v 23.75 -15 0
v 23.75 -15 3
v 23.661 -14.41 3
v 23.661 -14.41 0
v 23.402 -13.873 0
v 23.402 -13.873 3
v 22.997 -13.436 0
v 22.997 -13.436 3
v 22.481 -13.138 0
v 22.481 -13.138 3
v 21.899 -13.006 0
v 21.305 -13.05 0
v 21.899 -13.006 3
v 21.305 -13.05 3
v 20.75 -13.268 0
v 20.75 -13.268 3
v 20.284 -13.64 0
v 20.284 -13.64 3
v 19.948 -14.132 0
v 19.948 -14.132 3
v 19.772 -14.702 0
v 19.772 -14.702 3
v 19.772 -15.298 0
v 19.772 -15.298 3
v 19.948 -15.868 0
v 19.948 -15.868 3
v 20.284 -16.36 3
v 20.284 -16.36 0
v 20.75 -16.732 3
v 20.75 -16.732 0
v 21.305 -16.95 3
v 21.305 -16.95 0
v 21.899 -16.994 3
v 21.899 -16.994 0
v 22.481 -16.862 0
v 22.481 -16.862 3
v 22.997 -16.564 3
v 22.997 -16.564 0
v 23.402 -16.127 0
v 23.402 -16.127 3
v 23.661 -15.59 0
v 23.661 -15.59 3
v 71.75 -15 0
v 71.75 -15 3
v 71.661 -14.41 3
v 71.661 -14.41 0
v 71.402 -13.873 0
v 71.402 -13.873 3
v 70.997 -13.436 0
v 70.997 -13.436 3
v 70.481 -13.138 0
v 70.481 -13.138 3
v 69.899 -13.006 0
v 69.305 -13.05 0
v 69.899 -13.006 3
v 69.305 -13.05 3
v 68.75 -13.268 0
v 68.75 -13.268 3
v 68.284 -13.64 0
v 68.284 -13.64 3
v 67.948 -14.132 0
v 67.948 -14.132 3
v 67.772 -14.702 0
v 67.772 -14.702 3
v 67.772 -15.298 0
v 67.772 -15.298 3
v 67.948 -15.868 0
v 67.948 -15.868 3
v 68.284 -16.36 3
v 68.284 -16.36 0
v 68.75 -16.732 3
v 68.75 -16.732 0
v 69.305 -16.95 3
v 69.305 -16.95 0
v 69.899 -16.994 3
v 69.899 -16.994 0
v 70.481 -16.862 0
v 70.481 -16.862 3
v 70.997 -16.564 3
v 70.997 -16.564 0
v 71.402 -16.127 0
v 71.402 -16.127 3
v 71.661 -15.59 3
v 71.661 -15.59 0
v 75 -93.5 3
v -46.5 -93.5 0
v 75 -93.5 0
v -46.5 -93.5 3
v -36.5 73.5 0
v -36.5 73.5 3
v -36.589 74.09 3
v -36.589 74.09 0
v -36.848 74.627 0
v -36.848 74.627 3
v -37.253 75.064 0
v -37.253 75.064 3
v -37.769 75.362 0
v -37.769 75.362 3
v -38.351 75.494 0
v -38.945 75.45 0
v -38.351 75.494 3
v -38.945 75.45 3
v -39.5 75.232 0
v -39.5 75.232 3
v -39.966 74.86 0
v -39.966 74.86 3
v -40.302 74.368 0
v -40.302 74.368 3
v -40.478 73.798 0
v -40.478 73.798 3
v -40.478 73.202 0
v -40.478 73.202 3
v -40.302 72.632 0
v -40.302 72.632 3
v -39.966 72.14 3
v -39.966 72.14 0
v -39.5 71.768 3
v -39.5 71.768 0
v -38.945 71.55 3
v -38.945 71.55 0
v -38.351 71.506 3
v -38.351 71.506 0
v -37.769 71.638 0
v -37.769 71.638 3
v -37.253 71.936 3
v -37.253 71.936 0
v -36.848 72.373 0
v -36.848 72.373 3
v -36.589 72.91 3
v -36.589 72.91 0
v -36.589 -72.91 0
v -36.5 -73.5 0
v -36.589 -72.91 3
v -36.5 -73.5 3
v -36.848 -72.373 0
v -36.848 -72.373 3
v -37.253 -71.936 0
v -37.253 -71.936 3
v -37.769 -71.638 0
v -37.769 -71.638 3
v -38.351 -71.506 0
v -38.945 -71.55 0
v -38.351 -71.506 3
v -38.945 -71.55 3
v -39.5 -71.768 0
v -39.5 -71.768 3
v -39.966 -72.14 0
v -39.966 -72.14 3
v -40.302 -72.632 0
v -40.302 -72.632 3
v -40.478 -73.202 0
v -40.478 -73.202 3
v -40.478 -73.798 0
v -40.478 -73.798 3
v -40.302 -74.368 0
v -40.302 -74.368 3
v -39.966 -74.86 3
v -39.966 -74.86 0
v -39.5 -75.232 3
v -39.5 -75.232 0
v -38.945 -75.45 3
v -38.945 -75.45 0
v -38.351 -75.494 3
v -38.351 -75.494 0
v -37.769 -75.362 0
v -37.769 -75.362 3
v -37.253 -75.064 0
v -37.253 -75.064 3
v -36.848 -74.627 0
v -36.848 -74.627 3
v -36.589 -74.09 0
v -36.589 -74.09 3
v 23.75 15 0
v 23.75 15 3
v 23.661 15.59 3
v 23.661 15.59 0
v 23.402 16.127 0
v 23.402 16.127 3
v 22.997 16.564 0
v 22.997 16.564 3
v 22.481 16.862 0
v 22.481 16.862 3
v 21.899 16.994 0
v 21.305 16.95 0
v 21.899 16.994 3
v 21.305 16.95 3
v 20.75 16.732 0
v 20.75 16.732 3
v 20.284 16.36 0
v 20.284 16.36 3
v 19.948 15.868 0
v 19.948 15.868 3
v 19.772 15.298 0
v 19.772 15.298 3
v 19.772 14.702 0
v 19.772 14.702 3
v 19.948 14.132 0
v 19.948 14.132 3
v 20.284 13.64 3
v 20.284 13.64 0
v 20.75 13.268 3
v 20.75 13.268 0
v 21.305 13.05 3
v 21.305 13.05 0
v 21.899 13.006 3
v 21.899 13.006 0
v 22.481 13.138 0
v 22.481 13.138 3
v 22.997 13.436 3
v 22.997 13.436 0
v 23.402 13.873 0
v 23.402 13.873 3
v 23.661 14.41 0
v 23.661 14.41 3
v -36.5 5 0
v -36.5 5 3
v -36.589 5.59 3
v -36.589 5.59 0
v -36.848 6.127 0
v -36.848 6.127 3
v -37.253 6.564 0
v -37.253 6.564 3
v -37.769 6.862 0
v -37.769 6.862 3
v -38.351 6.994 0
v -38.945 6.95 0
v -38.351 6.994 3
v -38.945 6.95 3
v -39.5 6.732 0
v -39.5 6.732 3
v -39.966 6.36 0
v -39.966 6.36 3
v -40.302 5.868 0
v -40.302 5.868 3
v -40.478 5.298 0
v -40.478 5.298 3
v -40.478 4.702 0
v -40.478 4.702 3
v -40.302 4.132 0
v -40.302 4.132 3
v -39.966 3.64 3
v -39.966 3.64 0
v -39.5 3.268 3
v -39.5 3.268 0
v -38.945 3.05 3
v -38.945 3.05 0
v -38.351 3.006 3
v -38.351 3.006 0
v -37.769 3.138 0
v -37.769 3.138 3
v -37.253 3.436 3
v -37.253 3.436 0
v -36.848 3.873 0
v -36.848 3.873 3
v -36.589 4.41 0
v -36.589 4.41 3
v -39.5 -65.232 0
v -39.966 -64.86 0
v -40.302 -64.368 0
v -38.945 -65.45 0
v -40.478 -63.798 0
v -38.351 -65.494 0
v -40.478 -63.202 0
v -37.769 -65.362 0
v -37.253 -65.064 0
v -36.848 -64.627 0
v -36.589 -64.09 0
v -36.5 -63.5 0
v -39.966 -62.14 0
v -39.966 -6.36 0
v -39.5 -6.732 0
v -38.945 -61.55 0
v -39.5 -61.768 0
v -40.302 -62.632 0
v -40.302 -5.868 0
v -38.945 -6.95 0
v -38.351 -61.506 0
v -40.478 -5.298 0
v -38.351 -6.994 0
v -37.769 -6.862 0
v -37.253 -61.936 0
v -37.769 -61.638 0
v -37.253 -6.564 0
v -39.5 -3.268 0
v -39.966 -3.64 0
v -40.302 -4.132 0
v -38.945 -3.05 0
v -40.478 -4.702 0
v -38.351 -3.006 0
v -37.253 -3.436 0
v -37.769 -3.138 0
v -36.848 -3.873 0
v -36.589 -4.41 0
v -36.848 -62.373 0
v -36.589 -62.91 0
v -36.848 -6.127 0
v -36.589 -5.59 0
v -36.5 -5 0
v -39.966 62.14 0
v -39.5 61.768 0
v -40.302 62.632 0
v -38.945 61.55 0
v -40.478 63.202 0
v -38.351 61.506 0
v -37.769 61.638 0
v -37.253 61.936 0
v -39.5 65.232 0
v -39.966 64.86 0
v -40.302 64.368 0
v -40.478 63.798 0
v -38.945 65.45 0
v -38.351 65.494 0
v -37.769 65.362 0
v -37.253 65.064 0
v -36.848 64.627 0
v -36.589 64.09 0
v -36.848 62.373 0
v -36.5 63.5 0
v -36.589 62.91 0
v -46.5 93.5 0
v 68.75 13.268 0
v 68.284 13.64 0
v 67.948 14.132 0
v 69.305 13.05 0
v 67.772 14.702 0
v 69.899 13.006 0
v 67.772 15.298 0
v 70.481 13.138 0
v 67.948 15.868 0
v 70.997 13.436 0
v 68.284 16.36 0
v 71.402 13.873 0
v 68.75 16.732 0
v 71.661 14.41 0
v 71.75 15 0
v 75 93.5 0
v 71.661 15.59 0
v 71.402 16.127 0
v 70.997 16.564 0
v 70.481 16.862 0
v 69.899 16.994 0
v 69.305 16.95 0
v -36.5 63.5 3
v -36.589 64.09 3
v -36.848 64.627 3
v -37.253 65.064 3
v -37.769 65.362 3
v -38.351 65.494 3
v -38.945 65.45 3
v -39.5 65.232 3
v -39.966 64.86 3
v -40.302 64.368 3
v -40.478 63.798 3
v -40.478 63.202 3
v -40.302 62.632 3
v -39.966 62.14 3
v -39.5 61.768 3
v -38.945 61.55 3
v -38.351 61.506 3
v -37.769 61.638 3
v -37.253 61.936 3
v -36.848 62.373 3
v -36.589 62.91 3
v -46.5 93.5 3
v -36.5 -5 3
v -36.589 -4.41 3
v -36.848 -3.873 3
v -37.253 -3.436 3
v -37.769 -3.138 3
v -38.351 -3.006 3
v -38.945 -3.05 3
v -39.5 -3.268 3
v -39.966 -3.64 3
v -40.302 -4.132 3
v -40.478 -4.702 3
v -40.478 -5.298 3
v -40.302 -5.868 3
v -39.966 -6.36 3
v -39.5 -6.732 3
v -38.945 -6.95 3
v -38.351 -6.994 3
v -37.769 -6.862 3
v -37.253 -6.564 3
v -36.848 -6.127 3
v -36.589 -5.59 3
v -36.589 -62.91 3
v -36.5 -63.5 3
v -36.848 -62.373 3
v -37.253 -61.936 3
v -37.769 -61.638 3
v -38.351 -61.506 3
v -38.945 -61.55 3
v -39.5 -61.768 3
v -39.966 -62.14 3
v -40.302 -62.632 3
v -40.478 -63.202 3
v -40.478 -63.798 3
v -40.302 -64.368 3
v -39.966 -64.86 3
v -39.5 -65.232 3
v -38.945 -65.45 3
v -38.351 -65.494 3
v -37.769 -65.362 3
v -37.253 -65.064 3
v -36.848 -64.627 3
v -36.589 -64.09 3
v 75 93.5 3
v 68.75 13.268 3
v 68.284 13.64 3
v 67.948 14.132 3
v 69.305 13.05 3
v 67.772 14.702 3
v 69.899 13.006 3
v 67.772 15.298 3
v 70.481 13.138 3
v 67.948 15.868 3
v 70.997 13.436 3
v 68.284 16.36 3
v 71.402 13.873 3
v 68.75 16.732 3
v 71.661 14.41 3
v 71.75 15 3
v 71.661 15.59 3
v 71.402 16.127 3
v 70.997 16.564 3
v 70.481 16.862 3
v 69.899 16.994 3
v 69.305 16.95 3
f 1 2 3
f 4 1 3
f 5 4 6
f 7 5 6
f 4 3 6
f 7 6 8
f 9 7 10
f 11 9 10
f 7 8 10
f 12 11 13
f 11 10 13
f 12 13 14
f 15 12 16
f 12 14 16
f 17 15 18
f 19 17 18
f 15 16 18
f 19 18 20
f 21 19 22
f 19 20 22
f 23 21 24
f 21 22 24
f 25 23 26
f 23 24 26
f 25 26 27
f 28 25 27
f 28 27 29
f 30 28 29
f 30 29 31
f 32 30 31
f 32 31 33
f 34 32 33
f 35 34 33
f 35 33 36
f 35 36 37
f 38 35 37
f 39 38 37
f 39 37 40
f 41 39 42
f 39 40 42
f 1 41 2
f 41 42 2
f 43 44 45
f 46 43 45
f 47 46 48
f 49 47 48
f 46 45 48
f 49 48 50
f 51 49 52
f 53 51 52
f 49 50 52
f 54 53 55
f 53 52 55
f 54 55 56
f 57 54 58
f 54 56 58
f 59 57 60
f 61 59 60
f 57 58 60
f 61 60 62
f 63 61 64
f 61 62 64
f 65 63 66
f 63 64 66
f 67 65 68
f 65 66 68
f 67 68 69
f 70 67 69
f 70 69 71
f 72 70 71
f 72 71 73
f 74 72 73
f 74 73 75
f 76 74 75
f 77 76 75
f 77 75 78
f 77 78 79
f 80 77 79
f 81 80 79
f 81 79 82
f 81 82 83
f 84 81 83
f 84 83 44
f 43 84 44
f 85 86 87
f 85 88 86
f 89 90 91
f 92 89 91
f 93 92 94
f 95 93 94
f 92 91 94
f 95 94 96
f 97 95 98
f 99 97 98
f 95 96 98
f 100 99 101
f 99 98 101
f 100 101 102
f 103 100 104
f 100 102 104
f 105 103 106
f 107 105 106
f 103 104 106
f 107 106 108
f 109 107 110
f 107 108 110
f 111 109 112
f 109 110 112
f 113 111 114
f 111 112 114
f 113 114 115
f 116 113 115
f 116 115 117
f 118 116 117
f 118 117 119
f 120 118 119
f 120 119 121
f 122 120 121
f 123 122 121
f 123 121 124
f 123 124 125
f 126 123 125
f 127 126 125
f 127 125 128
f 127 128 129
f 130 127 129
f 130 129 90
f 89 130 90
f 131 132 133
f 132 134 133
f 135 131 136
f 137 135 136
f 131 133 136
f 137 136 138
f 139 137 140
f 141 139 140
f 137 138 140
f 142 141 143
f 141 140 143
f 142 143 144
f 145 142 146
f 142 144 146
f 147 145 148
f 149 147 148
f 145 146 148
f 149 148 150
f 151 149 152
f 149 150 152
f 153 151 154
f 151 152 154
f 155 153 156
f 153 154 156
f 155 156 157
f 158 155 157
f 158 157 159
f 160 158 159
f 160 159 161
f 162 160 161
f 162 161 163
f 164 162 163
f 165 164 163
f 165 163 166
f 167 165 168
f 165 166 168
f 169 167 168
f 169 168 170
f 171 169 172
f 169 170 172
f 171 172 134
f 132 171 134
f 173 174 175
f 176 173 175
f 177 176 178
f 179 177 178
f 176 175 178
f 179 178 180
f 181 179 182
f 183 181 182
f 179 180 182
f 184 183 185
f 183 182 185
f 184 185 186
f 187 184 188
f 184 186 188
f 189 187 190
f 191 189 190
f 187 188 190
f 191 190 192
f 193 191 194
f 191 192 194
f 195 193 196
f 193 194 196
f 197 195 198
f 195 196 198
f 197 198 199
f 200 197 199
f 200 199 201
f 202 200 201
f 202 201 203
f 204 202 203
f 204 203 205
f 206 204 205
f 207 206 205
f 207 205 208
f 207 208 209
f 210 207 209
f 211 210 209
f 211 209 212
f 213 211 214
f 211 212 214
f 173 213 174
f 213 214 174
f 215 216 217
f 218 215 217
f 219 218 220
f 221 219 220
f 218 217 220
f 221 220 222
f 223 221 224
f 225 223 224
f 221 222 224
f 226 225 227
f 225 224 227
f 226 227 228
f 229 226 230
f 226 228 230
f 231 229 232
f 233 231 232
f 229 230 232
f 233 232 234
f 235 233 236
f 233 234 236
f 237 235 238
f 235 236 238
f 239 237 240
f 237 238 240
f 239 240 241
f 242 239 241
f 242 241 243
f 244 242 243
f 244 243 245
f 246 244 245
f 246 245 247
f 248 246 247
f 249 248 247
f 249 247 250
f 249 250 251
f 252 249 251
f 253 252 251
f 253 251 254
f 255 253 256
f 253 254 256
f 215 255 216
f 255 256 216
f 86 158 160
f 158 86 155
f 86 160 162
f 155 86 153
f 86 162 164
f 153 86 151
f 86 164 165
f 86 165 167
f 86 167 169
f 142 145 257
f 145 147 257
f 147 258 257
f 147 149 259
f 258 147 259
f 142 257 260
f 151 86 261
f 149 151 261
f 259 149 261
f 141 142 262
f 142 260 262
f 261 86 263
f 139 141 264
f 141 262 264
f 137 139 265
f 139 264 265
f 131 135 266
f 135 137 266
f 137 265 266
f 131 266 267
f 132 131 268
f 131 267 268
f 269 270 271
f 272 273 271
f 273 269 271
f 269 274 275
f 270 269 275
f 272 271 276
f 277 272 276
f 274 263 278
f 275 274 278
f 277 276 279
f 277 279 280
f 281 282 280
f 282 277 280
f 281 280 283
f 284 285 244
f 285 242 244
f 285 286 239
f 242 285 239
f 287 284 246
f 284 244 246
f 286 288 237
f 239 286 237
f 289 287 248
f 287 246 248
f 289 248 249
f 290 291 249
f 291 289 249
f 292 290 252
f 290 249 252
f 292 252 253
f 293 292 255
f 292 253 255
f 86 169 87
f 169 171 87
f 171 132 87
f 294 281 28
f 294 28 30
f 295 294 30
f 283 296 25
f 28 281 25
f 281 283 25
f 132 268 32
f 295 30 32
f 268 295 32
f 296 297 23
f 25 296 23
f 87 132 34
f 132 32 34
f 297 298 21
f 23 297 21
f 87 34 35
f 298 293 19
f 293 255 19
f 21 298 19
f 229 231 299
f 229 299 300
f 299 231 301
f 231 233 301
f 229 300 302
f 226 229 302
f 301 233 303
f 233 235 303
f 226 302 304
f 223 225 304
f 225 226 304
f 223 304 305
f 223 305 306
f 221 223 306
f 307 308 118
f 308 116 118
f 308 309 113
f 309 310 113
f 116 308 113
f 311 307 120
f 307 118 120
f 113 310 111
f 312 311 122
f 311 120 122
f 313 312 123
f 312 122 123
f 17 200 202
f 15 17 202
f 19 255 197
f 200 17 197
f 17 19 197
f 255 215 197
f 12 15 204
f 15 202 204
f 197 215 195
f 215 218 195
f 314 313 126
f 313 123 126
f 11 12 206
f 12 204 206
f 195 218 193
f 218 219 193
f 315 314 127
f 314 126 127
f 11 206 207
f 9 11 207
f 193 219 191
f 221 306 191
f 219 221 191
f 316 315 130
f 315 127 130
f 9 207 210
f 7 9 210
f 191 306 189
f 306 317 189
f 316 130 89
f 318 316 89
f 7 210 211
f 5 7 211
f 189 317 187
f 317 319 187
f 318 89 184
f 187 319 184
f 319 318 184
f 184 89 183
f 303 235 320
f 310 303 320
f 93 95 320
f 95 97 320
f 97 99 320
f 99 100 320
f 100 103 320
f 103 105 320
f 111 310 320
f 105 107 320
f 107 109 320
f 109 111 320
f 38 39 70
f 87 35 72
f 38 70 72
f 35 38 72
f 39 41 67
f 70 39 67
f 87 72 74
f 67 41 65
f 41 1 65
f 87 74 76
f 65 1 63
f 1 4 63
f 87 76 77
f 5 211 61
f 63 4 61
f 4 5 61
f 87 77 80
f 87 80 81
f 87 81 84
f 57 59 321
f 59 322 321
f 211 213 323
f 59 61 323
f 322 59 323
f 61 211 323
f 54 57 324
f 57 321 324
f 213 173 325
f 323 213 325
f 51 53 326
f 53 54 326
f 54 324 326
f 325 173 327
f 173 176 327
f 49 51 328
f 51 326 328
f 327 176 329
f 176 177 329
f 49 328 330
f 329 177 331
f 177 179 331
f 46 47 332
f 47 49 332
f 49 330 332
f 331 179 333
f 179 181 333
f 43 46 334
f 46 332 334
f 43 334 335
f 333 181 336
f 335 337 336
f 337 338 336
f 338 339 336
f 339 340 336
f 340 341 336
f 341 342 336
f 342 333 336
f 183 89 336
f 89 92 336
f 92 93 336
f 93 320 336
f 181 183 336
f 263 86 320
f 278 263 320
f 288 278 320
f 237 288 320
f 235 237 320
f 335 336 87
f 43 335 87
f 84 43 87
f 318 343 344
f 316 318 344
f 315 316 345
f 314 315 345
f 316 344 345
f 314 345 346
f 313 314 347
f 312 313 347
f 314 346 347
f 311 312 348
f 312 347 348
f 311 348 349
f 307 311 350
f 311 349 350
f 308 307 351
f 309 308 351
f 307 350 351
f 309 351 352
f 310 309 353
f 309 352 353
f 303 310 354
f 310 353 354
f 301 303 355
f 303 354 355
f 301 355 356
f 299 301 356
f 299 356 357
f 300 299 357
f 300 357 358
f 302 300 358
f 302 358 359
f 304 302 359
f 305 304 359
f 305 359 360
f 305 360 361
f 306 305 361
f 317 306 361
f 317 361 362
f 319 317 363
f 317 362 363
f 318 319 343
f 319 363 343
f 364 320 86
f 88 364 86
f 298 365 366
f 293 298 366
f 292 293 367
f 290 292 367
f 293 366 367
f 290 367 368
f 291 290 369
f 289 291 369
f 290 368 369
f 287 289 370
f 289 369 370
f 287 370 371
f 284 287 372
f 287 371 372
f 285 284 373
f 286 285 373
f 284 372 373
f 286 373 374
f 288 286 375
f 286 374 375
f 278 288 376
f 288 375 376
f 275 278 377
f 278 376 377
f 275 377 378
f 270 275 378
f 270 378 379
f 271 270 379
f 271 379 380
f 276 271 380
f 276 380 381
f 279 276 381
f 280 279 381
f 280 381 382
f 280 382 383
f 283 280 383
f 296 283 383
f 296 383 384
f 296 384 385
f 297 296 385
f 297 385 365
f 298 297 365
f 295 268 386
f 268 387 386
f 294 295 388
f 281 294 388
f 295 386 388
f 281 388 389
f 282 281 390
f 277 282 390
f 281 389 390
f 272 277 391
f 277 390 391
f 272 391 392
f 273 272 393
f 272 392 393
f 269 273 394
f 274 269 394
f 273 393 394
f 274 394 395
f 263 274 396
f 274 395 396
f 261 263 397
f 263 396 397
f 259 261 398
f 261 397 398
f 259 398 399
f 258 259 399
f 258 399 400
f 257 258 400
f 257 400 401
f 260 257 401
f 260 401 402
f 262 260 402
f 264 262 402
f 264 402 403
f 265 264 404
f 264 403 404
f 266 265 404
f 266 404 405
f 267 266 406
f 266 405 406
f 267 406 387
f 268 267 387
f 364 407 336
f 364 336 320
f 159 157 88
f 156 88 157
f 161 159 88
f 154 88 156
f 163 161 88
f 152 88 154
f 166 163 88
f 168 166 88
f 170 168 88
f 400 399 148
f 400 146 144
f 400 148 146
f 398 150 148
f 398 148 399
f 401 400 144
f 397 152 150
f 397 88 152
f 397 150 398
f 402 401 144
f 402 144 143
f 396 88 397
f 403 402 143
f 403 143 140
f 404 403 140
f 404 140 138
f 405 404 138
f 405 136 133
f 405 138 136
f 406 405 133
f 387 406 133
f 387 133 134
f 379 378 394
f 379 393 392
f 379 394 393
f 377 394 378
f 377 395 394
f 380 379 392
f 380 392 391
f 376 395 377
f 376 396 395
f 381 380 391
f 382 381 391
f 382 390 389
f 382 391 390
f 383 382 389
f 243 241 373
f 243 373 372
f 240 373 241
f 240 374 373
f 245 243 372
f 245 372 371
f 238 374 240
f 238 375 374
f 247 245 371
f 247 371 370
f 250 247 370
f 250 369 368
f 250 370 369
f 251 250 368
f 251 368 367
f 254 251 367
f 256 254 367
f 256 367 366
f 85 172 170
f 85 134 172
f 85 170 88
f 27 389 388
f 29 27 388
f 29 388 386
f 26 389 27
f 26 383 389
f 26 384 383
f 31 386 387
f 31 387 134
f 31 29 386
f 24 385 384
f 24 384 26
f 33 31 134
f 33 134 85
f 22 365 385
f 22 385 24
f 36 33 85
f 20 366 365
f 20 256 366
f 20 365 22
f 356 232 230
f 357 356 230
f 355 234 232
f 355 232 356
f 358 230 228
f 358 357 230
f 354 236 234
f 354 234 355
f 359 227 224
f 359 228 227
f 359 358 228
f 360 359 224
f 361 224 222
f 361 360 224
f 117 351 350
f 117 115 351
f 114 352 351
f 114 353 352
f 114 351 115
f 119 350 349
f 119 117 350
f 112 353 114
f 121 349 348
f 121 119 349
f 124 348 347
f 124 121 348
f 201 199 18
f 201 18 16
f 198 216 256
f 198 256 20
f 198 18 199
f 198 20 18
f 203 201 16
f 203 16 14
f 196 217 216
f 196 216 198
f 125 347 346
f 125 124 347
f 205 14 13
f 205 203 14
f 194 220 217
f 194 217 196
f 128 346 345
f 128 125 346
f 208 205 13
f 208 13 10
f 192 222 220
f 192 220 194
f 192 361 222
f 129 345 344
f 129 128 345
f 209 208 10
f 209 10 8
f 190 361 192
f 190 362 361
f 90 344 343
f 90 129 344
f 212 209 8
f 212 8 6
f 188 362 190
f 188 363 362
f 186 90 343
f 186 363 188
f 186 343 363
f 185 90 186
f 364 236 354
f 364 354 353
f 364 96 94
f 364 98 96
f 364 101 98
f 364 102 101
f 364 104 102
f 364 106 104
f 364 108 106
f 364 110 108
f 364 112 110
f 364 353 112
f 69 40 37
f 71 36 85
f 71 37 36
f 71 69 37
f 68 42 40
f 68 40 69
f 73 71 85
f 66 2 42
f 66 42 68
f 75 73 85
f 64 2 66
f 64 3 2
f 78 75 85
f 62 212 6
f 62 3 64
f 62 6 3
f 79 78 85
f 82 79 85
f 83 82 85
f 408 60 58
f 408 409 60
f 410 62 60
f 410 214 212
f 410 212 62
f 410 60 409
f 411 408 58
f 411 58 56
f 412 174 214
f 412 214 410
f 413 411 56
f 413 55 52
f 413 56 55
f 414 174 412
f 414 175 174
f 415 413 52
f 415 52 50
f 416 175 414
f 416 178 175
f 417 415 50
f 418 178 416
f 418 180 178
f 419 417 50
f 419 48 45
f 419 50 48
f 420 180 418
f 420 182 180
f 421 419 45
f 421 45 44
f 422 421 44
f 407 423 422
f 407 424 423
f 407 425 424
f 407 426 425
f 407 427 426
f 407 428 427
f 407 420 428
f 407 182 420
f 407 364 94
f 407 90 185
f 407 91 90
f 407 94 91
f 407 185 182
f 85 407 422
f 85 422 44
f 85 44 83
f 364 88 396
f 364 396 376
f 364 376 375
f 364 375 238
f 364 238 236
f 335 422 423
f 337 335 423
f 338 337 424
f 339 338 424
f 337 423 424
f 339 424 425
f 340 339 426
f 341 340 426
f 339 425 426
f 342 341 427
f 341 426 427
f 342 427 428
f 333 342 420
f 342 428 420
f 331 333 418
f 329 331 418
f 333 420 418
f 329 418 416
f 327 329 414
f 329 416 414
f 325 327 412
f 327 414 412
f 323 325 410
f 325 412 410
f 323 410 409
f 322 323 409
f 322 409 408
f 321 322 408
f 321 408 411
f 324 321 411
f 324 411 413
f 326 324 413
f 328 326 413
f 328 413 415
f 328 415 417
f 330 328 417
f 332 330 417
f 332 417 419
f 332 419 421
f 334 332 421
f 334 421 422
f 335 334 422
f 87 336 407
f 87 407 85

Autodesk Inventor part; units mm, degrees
ref_plane "YZ Plane" through (0, 0, 0) normal (1, 0, 0) x (0, 1, 0)
ref_plane "XZ Plane" through (0, 0, 0) normal (0, 1, 0) x (-1, 0, 0)
ref_plane "XY Plane" through (0, 0, 0) normal (0, 0, 1) x (1, 0, 0)
sketch "Sketch1" plane through (0, 0, 0) normal (0, 0, 1) x (1, 0, 0)
  line L0 (-90.5, -90.5) -> (90.5, -90.5)
  line L1 (90.5, -90.5) -> (90.5, 90.5)
  line L2 (90.5, 90.5) -> (-90.5, 90.5)
  line L3 (-90.5, 90.5) -> (-90.5, -90.5)
  line L4 (-90.5, -90.5) -> (90.5, 90.5) construction
  line L5 (90.5, -90.5) -> (-90.5, 90.5) construction
  point P0 (0, 0)
  dimension "d0" = 181
  dimension "d1" = 181
extrude "Extrusion1" add sketch "Sketch1" along normal blind 3
sketch "Sketch3" plane through (0, 0, 3) normal (0, 0, 1) x (1, 0, 0)
  line L0 (-90.5, 90.5) -> (-90.5, -90.5) projected
  line L1 (-90.5, 82.5) -> (-87.5, 82.5)
  line L2 (-87.5, 82.5) -> (-87.5, 67.5)
  line L3 (-87.5, 67.5) -> (-90.5, 67.5)
  line L4 (-90.5, 67.5) -> (-90.5, 82.5)
  line L5 (-85, 93.5) -> (-90.5, 93.5) projected
  line L6 (-90.5, 52.5) -> (-87.5, 52.5)
  line L7 (-87.5, 52.5) -> (-87.5, 37.5)
  line L8 (-87.5, 37.5) -> (-90.5, 37.5)
  line L9 (-90.5, 37.5) -> (-90.5, 52.5)
  line L10 (-90.5, 22.5) -> (-87.5, 22.5)
  line L11 (-87.5, 22.5) -> (-87.5, 7.5)
  line L12 (-87.5, 7.5) -> (-90.5, 7.5)
  line L13 (-90.5, 7.5) -> (-90.5, 22.5)
  line L14 (-90.5, -7.5) -> (-87.5, -7.5)
  line L15 (-87.5, -7.5) -> (-87.5, -22.5)
  line L16 (-87.5, -22.5) -> (-90.5, -22.5)
  line L17 (-90.5, -22.5) -> (-90.5, -7.5)
  line L18 (-90.5, -37.5) -> (-87.5, -37.5)
  line L19 (-87.5, -37.5) -> (-87.5, -52.5)
  line L20 (-87.5, -52.5) -> (-90.5, -52.5)
  line L21 (-90.5, -52.5) -> (-90.5, -37.5)
  line L22 (-90.5, -67.5) -> (-87.5, -67.5)
  line L23 (-87.5, -67.5) -> (-87.5, -82.5)
  line L24 (-87.5, -82.5) -> (-90.5, -82.5)
  line L25 (-90.5, -82.5) -> (-90.5, -67.5)
  line L26 (87.5, 82.5) -> (90.5, 82.5)
  line L27 (90.5, 82.5) -> (90.5, 67.5)
  line L28 (90.5, 67.5) -> (87.5, 67.5)
  line L29 (87.5, 67.5) -> (87.5, 82.5)
  line L30 (87.5, 52.5) -> (90.5, 52.5)
  line L31 (90.5, 52.5) -> (90.5, 37.5)
  line L32 (90.5, 37.5) -> (87.5, 37.5)
  line L33 (87.5, 37.5) -> (87.5, 52.5)
  line L34 (87.5, 22.5) -> (90.5, 22.5)
  line L35 (90.5, 22.5) -> (90.5, 7.5)
  line L36 (90.5, 7.5) -> (87.5, 7.5)
  line L37 (87.5, 7.5) -> (87.5, 22.5)
  line L38 (87.5, -7.5) -> (90.5, -7.5)
  line L39 (90.5, -7.5) -> (90.5, -22.5)
  line L40 (90.5, -22.5) -> (87.5, -22.5)
  line L41 (87.5, -22.5) -> (87.5, -7.5)
  line L42 (87.5, -37.5) -> (90.5, -37.5)
  line L43 (90.5, -37.5) -> (90.5, -52.5)
  line L44 (90.5, -52.5) -> (87.5, -52.5)
  line L45 (87.5, -52.5) -> (87.5, -37.5)
  line L46 (87.5, -67.5) -> (90.5, -67.5)
  line L47 (90.5, -67.5) -> (90.5, -82.5)
  line L48 (90.5, -82.5) -> (87.5, -82.5)
  line L49 (87.5, -82.5) -> (87.5, -67.5)
  point P0 (0, 0)
  point P1 (-90.5, -93.5)
  dimension "d27" = 3
  dimension "d28" = 15
  dimension "d29" = 11
  dimension "d32" = 30
  dimension "d35" = 178
extrude "Extrusion3" cut sketch "Sketch3" against normal blind 3
sketch "Sketch4" plane through (0, 0, 3) normal (0, 0, 1) x (1, 0, 0)
  line L0 (80, 93.5) -> (85.5, 93.5) projected
  line L1 (90.5, 90.5) -> (-90.5, 90.5) projected
  line L2 (85.5, 93.5) -> (90.5, 93.5)
  line L3 (90.5, 93.5) -> (90.5, 90.5)
  line L4 (90.5, 90.5) -> (85.5, 90.5)
  line L5 (85.5, 90.5) -> (85.5, 93.5)
  line L6 (-90.5, -90.5) -> (90.5, -90.5) projected
  line L7 (85.5, -90.5) -> (90.5, -90.5)
  line L8 (90.5, -90.5) -> (90.5, -93.5)
  line L9 (90.5, -93.5) -> (85.5, -93.5)
  line L10 (85.5, -93.5) -> (85.5, -90.5)
  point P0 (0, 0)
  point P1 (85.5, 90.5)
  dimension "d40" = 184
extrude "Extrusion4" add sketch "Sketch4" against normal blind 3
sketch "Sketch6" plane through (0, 0, 0) normal (0, 0, -1) x (-1, 0, 0)
  line L0 (-90.5, 82.5) -> (-90.5, 93.5) projected
  line L1 (-90.5, 93.5) -> (-75, 93.5)
  line L2 (-75, 93.5) -> (-75, -93.5)
  line L3 (-75, -93.5) -> (-90.5, -93.5)
  line L4 (-90.5, -93.5) -> (-90.5, 93.5)
  line L5 (85, 93.5) -> (90.5, 93.5) projected
  line L6 (90.5, 93.5) -> (46.5, 93.5)
  line L7 (46.5, 93.5) -> (46.5, -93.5)
  line L8 (46.5, -93.5) -> (90.5, -93.5)
  line L9 (90.5, -93.5) -> (90.5, 93.5)
  point P0 (0, 0)
  dimension "d47" = 15.5
  dimension "d48" = 44
  dimension "d49" = 187
  dimension "d50" = 187
extrude "Extrusion6" cut sketch "Sketch6" against normal blind 10
sketch "Sketch7" plane through (0, 0, 3) normal (0, 0, 1) x (1, 0, 0)
  circle A0 centre (-38.5, 73.5) radius 2
  circle A1 centre (-38.5, 63.5) radius 2
  circle A2 centre (-38.5, 5) radius 2
  circle A3 centre (-38.5, -5) radius 2
  circle A4 centre (-38.5, -63.5) radius 2
  circle A5 centre (-38.5, -73.5) radius 2
  line L0 (-40, 93.5) -> (-25, 93.5) projected
  line L1 (-25, -93.5) -> (-40, -93.5) projected
  line L2 (-46.5, 90.5) -> (-46.5, -90.5) projected
  point P0 (0, 0)
  dimension "d53" = 4
  dimension "d54" = 4
  dimension "d55" = 4
  dimension "d56" = 4
  dimension "d57" = 4
  dimension "d58" = 4
  dimension "d59" = 0
  dimension "d60" = 0
  dimension "d61" = 0
  dimension "d62" = 10
  dimension "d63" = 10
  dimension "d64" = 10
  dimension "d65" = 20
  dimension "d66" = 20
  dimension "d67" = 8
  dimension "d68" = 8
  dimension "d69" = 8
  dimension "d70" = 5
extrude "Extrusion7" cut sketch "Sketch7" against normal blind 10
sketch "Sketch8" plane through (0, 0, 3) normal (0, 0, 1) x (1, 0, 0)
  line L0 (-46.5, 90.5) -> (75, 90.5)
  line L1 (75, 90.5) -> (75, 93.5)
  line L2 (75, 93.5) -> (-46.5, 93.5)
  line L3 (-46.5, 93.5) -> (-46.5, 90.5)
  line L4 (-46.5, -93.5) -> (75, -93.5)
  line L5 (75, -93.5) -> (75, -90.5)
  line L6 (75, -90.5) -> (-46.5, -90.5)
  line L7 (-46.5, -90.5) -> (-46.5, -93.5)
  point P0 (0, 0)
  dimension "d81" = 121.5
  dimension "d82" = 3
  dimension "d85" = 184
extrude "Extrusion8" add sketch "Sketch8" against normal blind 3
sketch "Sketch9" plane through (0, 0, 3) normal (0, 0, 1) x (1, 0, 0)
  line L0 (21.75, 15) -> (69.75, 15) construction
  line L1 (69.75, 15) -> (69.75, -15) construction
  line L2 (69.75, -15) -> (21.75, -15) construction
  line L3 (21.75, -15) -> (21.75, 15) construction
  line L4 (21.75, 15) -> (69.75, -15) construction
  line L5 (69.75, 15) -> (21.75, -15) construction
  line L6 (75, -93.5) -> (75, 93.5) projected
  circle A0 centre (21.75, 15) radius 2
  circle A1 centre (69.75, 15) radius 2
  circle A2 centre (69.75, -15) radius 2
  circle A3 centre (21.75, -15) radius 2
  point P0 (0, 0)
  point P1 (45.75, 0)
  dimension "d92" = 48
  dimension "d93" = 30
  dimension "d94" = 0
  dimension "d95" = 5.25
  dimension "d96" = 4
  dimension "d97" = 4
  dimension "d98" = 4
  dimension "d99" = 4
extrude "Extrusion9" cut sketch "Sketch9" against normal blind 3
equation "\"d54\" = d53"
equation "\"d55\" = d53"
equation "\"d56\" = d55"
equation "\"d57\" = d56"
equation "\"d58\" = d57"
equation "\"d63\" = d62"
equation "\"d64\" = d62"
equation "\"d68\" = d67"
equation "\"d69\" = d67"
equation "\"BendRadius\" = Thickness"
equation "\"BendReliefWidth\" = Thickness"
equation "\"BendReliefDepth\" = 0.5 * Thickness"
equation "\"CornerReliefSize\" = 4 * Thickness"
equation "\"MinimumRemnant\" = 2 * Thickness"
equation "\"TransitionRadius\" = BendRadius"
equation "\"JacobiRadiusSize\" = BendRadius"
equation "\"GapSize\" = Thickness"
equation "\"Thickness\" = 0.5"
properties part number "11 deur plaat"
